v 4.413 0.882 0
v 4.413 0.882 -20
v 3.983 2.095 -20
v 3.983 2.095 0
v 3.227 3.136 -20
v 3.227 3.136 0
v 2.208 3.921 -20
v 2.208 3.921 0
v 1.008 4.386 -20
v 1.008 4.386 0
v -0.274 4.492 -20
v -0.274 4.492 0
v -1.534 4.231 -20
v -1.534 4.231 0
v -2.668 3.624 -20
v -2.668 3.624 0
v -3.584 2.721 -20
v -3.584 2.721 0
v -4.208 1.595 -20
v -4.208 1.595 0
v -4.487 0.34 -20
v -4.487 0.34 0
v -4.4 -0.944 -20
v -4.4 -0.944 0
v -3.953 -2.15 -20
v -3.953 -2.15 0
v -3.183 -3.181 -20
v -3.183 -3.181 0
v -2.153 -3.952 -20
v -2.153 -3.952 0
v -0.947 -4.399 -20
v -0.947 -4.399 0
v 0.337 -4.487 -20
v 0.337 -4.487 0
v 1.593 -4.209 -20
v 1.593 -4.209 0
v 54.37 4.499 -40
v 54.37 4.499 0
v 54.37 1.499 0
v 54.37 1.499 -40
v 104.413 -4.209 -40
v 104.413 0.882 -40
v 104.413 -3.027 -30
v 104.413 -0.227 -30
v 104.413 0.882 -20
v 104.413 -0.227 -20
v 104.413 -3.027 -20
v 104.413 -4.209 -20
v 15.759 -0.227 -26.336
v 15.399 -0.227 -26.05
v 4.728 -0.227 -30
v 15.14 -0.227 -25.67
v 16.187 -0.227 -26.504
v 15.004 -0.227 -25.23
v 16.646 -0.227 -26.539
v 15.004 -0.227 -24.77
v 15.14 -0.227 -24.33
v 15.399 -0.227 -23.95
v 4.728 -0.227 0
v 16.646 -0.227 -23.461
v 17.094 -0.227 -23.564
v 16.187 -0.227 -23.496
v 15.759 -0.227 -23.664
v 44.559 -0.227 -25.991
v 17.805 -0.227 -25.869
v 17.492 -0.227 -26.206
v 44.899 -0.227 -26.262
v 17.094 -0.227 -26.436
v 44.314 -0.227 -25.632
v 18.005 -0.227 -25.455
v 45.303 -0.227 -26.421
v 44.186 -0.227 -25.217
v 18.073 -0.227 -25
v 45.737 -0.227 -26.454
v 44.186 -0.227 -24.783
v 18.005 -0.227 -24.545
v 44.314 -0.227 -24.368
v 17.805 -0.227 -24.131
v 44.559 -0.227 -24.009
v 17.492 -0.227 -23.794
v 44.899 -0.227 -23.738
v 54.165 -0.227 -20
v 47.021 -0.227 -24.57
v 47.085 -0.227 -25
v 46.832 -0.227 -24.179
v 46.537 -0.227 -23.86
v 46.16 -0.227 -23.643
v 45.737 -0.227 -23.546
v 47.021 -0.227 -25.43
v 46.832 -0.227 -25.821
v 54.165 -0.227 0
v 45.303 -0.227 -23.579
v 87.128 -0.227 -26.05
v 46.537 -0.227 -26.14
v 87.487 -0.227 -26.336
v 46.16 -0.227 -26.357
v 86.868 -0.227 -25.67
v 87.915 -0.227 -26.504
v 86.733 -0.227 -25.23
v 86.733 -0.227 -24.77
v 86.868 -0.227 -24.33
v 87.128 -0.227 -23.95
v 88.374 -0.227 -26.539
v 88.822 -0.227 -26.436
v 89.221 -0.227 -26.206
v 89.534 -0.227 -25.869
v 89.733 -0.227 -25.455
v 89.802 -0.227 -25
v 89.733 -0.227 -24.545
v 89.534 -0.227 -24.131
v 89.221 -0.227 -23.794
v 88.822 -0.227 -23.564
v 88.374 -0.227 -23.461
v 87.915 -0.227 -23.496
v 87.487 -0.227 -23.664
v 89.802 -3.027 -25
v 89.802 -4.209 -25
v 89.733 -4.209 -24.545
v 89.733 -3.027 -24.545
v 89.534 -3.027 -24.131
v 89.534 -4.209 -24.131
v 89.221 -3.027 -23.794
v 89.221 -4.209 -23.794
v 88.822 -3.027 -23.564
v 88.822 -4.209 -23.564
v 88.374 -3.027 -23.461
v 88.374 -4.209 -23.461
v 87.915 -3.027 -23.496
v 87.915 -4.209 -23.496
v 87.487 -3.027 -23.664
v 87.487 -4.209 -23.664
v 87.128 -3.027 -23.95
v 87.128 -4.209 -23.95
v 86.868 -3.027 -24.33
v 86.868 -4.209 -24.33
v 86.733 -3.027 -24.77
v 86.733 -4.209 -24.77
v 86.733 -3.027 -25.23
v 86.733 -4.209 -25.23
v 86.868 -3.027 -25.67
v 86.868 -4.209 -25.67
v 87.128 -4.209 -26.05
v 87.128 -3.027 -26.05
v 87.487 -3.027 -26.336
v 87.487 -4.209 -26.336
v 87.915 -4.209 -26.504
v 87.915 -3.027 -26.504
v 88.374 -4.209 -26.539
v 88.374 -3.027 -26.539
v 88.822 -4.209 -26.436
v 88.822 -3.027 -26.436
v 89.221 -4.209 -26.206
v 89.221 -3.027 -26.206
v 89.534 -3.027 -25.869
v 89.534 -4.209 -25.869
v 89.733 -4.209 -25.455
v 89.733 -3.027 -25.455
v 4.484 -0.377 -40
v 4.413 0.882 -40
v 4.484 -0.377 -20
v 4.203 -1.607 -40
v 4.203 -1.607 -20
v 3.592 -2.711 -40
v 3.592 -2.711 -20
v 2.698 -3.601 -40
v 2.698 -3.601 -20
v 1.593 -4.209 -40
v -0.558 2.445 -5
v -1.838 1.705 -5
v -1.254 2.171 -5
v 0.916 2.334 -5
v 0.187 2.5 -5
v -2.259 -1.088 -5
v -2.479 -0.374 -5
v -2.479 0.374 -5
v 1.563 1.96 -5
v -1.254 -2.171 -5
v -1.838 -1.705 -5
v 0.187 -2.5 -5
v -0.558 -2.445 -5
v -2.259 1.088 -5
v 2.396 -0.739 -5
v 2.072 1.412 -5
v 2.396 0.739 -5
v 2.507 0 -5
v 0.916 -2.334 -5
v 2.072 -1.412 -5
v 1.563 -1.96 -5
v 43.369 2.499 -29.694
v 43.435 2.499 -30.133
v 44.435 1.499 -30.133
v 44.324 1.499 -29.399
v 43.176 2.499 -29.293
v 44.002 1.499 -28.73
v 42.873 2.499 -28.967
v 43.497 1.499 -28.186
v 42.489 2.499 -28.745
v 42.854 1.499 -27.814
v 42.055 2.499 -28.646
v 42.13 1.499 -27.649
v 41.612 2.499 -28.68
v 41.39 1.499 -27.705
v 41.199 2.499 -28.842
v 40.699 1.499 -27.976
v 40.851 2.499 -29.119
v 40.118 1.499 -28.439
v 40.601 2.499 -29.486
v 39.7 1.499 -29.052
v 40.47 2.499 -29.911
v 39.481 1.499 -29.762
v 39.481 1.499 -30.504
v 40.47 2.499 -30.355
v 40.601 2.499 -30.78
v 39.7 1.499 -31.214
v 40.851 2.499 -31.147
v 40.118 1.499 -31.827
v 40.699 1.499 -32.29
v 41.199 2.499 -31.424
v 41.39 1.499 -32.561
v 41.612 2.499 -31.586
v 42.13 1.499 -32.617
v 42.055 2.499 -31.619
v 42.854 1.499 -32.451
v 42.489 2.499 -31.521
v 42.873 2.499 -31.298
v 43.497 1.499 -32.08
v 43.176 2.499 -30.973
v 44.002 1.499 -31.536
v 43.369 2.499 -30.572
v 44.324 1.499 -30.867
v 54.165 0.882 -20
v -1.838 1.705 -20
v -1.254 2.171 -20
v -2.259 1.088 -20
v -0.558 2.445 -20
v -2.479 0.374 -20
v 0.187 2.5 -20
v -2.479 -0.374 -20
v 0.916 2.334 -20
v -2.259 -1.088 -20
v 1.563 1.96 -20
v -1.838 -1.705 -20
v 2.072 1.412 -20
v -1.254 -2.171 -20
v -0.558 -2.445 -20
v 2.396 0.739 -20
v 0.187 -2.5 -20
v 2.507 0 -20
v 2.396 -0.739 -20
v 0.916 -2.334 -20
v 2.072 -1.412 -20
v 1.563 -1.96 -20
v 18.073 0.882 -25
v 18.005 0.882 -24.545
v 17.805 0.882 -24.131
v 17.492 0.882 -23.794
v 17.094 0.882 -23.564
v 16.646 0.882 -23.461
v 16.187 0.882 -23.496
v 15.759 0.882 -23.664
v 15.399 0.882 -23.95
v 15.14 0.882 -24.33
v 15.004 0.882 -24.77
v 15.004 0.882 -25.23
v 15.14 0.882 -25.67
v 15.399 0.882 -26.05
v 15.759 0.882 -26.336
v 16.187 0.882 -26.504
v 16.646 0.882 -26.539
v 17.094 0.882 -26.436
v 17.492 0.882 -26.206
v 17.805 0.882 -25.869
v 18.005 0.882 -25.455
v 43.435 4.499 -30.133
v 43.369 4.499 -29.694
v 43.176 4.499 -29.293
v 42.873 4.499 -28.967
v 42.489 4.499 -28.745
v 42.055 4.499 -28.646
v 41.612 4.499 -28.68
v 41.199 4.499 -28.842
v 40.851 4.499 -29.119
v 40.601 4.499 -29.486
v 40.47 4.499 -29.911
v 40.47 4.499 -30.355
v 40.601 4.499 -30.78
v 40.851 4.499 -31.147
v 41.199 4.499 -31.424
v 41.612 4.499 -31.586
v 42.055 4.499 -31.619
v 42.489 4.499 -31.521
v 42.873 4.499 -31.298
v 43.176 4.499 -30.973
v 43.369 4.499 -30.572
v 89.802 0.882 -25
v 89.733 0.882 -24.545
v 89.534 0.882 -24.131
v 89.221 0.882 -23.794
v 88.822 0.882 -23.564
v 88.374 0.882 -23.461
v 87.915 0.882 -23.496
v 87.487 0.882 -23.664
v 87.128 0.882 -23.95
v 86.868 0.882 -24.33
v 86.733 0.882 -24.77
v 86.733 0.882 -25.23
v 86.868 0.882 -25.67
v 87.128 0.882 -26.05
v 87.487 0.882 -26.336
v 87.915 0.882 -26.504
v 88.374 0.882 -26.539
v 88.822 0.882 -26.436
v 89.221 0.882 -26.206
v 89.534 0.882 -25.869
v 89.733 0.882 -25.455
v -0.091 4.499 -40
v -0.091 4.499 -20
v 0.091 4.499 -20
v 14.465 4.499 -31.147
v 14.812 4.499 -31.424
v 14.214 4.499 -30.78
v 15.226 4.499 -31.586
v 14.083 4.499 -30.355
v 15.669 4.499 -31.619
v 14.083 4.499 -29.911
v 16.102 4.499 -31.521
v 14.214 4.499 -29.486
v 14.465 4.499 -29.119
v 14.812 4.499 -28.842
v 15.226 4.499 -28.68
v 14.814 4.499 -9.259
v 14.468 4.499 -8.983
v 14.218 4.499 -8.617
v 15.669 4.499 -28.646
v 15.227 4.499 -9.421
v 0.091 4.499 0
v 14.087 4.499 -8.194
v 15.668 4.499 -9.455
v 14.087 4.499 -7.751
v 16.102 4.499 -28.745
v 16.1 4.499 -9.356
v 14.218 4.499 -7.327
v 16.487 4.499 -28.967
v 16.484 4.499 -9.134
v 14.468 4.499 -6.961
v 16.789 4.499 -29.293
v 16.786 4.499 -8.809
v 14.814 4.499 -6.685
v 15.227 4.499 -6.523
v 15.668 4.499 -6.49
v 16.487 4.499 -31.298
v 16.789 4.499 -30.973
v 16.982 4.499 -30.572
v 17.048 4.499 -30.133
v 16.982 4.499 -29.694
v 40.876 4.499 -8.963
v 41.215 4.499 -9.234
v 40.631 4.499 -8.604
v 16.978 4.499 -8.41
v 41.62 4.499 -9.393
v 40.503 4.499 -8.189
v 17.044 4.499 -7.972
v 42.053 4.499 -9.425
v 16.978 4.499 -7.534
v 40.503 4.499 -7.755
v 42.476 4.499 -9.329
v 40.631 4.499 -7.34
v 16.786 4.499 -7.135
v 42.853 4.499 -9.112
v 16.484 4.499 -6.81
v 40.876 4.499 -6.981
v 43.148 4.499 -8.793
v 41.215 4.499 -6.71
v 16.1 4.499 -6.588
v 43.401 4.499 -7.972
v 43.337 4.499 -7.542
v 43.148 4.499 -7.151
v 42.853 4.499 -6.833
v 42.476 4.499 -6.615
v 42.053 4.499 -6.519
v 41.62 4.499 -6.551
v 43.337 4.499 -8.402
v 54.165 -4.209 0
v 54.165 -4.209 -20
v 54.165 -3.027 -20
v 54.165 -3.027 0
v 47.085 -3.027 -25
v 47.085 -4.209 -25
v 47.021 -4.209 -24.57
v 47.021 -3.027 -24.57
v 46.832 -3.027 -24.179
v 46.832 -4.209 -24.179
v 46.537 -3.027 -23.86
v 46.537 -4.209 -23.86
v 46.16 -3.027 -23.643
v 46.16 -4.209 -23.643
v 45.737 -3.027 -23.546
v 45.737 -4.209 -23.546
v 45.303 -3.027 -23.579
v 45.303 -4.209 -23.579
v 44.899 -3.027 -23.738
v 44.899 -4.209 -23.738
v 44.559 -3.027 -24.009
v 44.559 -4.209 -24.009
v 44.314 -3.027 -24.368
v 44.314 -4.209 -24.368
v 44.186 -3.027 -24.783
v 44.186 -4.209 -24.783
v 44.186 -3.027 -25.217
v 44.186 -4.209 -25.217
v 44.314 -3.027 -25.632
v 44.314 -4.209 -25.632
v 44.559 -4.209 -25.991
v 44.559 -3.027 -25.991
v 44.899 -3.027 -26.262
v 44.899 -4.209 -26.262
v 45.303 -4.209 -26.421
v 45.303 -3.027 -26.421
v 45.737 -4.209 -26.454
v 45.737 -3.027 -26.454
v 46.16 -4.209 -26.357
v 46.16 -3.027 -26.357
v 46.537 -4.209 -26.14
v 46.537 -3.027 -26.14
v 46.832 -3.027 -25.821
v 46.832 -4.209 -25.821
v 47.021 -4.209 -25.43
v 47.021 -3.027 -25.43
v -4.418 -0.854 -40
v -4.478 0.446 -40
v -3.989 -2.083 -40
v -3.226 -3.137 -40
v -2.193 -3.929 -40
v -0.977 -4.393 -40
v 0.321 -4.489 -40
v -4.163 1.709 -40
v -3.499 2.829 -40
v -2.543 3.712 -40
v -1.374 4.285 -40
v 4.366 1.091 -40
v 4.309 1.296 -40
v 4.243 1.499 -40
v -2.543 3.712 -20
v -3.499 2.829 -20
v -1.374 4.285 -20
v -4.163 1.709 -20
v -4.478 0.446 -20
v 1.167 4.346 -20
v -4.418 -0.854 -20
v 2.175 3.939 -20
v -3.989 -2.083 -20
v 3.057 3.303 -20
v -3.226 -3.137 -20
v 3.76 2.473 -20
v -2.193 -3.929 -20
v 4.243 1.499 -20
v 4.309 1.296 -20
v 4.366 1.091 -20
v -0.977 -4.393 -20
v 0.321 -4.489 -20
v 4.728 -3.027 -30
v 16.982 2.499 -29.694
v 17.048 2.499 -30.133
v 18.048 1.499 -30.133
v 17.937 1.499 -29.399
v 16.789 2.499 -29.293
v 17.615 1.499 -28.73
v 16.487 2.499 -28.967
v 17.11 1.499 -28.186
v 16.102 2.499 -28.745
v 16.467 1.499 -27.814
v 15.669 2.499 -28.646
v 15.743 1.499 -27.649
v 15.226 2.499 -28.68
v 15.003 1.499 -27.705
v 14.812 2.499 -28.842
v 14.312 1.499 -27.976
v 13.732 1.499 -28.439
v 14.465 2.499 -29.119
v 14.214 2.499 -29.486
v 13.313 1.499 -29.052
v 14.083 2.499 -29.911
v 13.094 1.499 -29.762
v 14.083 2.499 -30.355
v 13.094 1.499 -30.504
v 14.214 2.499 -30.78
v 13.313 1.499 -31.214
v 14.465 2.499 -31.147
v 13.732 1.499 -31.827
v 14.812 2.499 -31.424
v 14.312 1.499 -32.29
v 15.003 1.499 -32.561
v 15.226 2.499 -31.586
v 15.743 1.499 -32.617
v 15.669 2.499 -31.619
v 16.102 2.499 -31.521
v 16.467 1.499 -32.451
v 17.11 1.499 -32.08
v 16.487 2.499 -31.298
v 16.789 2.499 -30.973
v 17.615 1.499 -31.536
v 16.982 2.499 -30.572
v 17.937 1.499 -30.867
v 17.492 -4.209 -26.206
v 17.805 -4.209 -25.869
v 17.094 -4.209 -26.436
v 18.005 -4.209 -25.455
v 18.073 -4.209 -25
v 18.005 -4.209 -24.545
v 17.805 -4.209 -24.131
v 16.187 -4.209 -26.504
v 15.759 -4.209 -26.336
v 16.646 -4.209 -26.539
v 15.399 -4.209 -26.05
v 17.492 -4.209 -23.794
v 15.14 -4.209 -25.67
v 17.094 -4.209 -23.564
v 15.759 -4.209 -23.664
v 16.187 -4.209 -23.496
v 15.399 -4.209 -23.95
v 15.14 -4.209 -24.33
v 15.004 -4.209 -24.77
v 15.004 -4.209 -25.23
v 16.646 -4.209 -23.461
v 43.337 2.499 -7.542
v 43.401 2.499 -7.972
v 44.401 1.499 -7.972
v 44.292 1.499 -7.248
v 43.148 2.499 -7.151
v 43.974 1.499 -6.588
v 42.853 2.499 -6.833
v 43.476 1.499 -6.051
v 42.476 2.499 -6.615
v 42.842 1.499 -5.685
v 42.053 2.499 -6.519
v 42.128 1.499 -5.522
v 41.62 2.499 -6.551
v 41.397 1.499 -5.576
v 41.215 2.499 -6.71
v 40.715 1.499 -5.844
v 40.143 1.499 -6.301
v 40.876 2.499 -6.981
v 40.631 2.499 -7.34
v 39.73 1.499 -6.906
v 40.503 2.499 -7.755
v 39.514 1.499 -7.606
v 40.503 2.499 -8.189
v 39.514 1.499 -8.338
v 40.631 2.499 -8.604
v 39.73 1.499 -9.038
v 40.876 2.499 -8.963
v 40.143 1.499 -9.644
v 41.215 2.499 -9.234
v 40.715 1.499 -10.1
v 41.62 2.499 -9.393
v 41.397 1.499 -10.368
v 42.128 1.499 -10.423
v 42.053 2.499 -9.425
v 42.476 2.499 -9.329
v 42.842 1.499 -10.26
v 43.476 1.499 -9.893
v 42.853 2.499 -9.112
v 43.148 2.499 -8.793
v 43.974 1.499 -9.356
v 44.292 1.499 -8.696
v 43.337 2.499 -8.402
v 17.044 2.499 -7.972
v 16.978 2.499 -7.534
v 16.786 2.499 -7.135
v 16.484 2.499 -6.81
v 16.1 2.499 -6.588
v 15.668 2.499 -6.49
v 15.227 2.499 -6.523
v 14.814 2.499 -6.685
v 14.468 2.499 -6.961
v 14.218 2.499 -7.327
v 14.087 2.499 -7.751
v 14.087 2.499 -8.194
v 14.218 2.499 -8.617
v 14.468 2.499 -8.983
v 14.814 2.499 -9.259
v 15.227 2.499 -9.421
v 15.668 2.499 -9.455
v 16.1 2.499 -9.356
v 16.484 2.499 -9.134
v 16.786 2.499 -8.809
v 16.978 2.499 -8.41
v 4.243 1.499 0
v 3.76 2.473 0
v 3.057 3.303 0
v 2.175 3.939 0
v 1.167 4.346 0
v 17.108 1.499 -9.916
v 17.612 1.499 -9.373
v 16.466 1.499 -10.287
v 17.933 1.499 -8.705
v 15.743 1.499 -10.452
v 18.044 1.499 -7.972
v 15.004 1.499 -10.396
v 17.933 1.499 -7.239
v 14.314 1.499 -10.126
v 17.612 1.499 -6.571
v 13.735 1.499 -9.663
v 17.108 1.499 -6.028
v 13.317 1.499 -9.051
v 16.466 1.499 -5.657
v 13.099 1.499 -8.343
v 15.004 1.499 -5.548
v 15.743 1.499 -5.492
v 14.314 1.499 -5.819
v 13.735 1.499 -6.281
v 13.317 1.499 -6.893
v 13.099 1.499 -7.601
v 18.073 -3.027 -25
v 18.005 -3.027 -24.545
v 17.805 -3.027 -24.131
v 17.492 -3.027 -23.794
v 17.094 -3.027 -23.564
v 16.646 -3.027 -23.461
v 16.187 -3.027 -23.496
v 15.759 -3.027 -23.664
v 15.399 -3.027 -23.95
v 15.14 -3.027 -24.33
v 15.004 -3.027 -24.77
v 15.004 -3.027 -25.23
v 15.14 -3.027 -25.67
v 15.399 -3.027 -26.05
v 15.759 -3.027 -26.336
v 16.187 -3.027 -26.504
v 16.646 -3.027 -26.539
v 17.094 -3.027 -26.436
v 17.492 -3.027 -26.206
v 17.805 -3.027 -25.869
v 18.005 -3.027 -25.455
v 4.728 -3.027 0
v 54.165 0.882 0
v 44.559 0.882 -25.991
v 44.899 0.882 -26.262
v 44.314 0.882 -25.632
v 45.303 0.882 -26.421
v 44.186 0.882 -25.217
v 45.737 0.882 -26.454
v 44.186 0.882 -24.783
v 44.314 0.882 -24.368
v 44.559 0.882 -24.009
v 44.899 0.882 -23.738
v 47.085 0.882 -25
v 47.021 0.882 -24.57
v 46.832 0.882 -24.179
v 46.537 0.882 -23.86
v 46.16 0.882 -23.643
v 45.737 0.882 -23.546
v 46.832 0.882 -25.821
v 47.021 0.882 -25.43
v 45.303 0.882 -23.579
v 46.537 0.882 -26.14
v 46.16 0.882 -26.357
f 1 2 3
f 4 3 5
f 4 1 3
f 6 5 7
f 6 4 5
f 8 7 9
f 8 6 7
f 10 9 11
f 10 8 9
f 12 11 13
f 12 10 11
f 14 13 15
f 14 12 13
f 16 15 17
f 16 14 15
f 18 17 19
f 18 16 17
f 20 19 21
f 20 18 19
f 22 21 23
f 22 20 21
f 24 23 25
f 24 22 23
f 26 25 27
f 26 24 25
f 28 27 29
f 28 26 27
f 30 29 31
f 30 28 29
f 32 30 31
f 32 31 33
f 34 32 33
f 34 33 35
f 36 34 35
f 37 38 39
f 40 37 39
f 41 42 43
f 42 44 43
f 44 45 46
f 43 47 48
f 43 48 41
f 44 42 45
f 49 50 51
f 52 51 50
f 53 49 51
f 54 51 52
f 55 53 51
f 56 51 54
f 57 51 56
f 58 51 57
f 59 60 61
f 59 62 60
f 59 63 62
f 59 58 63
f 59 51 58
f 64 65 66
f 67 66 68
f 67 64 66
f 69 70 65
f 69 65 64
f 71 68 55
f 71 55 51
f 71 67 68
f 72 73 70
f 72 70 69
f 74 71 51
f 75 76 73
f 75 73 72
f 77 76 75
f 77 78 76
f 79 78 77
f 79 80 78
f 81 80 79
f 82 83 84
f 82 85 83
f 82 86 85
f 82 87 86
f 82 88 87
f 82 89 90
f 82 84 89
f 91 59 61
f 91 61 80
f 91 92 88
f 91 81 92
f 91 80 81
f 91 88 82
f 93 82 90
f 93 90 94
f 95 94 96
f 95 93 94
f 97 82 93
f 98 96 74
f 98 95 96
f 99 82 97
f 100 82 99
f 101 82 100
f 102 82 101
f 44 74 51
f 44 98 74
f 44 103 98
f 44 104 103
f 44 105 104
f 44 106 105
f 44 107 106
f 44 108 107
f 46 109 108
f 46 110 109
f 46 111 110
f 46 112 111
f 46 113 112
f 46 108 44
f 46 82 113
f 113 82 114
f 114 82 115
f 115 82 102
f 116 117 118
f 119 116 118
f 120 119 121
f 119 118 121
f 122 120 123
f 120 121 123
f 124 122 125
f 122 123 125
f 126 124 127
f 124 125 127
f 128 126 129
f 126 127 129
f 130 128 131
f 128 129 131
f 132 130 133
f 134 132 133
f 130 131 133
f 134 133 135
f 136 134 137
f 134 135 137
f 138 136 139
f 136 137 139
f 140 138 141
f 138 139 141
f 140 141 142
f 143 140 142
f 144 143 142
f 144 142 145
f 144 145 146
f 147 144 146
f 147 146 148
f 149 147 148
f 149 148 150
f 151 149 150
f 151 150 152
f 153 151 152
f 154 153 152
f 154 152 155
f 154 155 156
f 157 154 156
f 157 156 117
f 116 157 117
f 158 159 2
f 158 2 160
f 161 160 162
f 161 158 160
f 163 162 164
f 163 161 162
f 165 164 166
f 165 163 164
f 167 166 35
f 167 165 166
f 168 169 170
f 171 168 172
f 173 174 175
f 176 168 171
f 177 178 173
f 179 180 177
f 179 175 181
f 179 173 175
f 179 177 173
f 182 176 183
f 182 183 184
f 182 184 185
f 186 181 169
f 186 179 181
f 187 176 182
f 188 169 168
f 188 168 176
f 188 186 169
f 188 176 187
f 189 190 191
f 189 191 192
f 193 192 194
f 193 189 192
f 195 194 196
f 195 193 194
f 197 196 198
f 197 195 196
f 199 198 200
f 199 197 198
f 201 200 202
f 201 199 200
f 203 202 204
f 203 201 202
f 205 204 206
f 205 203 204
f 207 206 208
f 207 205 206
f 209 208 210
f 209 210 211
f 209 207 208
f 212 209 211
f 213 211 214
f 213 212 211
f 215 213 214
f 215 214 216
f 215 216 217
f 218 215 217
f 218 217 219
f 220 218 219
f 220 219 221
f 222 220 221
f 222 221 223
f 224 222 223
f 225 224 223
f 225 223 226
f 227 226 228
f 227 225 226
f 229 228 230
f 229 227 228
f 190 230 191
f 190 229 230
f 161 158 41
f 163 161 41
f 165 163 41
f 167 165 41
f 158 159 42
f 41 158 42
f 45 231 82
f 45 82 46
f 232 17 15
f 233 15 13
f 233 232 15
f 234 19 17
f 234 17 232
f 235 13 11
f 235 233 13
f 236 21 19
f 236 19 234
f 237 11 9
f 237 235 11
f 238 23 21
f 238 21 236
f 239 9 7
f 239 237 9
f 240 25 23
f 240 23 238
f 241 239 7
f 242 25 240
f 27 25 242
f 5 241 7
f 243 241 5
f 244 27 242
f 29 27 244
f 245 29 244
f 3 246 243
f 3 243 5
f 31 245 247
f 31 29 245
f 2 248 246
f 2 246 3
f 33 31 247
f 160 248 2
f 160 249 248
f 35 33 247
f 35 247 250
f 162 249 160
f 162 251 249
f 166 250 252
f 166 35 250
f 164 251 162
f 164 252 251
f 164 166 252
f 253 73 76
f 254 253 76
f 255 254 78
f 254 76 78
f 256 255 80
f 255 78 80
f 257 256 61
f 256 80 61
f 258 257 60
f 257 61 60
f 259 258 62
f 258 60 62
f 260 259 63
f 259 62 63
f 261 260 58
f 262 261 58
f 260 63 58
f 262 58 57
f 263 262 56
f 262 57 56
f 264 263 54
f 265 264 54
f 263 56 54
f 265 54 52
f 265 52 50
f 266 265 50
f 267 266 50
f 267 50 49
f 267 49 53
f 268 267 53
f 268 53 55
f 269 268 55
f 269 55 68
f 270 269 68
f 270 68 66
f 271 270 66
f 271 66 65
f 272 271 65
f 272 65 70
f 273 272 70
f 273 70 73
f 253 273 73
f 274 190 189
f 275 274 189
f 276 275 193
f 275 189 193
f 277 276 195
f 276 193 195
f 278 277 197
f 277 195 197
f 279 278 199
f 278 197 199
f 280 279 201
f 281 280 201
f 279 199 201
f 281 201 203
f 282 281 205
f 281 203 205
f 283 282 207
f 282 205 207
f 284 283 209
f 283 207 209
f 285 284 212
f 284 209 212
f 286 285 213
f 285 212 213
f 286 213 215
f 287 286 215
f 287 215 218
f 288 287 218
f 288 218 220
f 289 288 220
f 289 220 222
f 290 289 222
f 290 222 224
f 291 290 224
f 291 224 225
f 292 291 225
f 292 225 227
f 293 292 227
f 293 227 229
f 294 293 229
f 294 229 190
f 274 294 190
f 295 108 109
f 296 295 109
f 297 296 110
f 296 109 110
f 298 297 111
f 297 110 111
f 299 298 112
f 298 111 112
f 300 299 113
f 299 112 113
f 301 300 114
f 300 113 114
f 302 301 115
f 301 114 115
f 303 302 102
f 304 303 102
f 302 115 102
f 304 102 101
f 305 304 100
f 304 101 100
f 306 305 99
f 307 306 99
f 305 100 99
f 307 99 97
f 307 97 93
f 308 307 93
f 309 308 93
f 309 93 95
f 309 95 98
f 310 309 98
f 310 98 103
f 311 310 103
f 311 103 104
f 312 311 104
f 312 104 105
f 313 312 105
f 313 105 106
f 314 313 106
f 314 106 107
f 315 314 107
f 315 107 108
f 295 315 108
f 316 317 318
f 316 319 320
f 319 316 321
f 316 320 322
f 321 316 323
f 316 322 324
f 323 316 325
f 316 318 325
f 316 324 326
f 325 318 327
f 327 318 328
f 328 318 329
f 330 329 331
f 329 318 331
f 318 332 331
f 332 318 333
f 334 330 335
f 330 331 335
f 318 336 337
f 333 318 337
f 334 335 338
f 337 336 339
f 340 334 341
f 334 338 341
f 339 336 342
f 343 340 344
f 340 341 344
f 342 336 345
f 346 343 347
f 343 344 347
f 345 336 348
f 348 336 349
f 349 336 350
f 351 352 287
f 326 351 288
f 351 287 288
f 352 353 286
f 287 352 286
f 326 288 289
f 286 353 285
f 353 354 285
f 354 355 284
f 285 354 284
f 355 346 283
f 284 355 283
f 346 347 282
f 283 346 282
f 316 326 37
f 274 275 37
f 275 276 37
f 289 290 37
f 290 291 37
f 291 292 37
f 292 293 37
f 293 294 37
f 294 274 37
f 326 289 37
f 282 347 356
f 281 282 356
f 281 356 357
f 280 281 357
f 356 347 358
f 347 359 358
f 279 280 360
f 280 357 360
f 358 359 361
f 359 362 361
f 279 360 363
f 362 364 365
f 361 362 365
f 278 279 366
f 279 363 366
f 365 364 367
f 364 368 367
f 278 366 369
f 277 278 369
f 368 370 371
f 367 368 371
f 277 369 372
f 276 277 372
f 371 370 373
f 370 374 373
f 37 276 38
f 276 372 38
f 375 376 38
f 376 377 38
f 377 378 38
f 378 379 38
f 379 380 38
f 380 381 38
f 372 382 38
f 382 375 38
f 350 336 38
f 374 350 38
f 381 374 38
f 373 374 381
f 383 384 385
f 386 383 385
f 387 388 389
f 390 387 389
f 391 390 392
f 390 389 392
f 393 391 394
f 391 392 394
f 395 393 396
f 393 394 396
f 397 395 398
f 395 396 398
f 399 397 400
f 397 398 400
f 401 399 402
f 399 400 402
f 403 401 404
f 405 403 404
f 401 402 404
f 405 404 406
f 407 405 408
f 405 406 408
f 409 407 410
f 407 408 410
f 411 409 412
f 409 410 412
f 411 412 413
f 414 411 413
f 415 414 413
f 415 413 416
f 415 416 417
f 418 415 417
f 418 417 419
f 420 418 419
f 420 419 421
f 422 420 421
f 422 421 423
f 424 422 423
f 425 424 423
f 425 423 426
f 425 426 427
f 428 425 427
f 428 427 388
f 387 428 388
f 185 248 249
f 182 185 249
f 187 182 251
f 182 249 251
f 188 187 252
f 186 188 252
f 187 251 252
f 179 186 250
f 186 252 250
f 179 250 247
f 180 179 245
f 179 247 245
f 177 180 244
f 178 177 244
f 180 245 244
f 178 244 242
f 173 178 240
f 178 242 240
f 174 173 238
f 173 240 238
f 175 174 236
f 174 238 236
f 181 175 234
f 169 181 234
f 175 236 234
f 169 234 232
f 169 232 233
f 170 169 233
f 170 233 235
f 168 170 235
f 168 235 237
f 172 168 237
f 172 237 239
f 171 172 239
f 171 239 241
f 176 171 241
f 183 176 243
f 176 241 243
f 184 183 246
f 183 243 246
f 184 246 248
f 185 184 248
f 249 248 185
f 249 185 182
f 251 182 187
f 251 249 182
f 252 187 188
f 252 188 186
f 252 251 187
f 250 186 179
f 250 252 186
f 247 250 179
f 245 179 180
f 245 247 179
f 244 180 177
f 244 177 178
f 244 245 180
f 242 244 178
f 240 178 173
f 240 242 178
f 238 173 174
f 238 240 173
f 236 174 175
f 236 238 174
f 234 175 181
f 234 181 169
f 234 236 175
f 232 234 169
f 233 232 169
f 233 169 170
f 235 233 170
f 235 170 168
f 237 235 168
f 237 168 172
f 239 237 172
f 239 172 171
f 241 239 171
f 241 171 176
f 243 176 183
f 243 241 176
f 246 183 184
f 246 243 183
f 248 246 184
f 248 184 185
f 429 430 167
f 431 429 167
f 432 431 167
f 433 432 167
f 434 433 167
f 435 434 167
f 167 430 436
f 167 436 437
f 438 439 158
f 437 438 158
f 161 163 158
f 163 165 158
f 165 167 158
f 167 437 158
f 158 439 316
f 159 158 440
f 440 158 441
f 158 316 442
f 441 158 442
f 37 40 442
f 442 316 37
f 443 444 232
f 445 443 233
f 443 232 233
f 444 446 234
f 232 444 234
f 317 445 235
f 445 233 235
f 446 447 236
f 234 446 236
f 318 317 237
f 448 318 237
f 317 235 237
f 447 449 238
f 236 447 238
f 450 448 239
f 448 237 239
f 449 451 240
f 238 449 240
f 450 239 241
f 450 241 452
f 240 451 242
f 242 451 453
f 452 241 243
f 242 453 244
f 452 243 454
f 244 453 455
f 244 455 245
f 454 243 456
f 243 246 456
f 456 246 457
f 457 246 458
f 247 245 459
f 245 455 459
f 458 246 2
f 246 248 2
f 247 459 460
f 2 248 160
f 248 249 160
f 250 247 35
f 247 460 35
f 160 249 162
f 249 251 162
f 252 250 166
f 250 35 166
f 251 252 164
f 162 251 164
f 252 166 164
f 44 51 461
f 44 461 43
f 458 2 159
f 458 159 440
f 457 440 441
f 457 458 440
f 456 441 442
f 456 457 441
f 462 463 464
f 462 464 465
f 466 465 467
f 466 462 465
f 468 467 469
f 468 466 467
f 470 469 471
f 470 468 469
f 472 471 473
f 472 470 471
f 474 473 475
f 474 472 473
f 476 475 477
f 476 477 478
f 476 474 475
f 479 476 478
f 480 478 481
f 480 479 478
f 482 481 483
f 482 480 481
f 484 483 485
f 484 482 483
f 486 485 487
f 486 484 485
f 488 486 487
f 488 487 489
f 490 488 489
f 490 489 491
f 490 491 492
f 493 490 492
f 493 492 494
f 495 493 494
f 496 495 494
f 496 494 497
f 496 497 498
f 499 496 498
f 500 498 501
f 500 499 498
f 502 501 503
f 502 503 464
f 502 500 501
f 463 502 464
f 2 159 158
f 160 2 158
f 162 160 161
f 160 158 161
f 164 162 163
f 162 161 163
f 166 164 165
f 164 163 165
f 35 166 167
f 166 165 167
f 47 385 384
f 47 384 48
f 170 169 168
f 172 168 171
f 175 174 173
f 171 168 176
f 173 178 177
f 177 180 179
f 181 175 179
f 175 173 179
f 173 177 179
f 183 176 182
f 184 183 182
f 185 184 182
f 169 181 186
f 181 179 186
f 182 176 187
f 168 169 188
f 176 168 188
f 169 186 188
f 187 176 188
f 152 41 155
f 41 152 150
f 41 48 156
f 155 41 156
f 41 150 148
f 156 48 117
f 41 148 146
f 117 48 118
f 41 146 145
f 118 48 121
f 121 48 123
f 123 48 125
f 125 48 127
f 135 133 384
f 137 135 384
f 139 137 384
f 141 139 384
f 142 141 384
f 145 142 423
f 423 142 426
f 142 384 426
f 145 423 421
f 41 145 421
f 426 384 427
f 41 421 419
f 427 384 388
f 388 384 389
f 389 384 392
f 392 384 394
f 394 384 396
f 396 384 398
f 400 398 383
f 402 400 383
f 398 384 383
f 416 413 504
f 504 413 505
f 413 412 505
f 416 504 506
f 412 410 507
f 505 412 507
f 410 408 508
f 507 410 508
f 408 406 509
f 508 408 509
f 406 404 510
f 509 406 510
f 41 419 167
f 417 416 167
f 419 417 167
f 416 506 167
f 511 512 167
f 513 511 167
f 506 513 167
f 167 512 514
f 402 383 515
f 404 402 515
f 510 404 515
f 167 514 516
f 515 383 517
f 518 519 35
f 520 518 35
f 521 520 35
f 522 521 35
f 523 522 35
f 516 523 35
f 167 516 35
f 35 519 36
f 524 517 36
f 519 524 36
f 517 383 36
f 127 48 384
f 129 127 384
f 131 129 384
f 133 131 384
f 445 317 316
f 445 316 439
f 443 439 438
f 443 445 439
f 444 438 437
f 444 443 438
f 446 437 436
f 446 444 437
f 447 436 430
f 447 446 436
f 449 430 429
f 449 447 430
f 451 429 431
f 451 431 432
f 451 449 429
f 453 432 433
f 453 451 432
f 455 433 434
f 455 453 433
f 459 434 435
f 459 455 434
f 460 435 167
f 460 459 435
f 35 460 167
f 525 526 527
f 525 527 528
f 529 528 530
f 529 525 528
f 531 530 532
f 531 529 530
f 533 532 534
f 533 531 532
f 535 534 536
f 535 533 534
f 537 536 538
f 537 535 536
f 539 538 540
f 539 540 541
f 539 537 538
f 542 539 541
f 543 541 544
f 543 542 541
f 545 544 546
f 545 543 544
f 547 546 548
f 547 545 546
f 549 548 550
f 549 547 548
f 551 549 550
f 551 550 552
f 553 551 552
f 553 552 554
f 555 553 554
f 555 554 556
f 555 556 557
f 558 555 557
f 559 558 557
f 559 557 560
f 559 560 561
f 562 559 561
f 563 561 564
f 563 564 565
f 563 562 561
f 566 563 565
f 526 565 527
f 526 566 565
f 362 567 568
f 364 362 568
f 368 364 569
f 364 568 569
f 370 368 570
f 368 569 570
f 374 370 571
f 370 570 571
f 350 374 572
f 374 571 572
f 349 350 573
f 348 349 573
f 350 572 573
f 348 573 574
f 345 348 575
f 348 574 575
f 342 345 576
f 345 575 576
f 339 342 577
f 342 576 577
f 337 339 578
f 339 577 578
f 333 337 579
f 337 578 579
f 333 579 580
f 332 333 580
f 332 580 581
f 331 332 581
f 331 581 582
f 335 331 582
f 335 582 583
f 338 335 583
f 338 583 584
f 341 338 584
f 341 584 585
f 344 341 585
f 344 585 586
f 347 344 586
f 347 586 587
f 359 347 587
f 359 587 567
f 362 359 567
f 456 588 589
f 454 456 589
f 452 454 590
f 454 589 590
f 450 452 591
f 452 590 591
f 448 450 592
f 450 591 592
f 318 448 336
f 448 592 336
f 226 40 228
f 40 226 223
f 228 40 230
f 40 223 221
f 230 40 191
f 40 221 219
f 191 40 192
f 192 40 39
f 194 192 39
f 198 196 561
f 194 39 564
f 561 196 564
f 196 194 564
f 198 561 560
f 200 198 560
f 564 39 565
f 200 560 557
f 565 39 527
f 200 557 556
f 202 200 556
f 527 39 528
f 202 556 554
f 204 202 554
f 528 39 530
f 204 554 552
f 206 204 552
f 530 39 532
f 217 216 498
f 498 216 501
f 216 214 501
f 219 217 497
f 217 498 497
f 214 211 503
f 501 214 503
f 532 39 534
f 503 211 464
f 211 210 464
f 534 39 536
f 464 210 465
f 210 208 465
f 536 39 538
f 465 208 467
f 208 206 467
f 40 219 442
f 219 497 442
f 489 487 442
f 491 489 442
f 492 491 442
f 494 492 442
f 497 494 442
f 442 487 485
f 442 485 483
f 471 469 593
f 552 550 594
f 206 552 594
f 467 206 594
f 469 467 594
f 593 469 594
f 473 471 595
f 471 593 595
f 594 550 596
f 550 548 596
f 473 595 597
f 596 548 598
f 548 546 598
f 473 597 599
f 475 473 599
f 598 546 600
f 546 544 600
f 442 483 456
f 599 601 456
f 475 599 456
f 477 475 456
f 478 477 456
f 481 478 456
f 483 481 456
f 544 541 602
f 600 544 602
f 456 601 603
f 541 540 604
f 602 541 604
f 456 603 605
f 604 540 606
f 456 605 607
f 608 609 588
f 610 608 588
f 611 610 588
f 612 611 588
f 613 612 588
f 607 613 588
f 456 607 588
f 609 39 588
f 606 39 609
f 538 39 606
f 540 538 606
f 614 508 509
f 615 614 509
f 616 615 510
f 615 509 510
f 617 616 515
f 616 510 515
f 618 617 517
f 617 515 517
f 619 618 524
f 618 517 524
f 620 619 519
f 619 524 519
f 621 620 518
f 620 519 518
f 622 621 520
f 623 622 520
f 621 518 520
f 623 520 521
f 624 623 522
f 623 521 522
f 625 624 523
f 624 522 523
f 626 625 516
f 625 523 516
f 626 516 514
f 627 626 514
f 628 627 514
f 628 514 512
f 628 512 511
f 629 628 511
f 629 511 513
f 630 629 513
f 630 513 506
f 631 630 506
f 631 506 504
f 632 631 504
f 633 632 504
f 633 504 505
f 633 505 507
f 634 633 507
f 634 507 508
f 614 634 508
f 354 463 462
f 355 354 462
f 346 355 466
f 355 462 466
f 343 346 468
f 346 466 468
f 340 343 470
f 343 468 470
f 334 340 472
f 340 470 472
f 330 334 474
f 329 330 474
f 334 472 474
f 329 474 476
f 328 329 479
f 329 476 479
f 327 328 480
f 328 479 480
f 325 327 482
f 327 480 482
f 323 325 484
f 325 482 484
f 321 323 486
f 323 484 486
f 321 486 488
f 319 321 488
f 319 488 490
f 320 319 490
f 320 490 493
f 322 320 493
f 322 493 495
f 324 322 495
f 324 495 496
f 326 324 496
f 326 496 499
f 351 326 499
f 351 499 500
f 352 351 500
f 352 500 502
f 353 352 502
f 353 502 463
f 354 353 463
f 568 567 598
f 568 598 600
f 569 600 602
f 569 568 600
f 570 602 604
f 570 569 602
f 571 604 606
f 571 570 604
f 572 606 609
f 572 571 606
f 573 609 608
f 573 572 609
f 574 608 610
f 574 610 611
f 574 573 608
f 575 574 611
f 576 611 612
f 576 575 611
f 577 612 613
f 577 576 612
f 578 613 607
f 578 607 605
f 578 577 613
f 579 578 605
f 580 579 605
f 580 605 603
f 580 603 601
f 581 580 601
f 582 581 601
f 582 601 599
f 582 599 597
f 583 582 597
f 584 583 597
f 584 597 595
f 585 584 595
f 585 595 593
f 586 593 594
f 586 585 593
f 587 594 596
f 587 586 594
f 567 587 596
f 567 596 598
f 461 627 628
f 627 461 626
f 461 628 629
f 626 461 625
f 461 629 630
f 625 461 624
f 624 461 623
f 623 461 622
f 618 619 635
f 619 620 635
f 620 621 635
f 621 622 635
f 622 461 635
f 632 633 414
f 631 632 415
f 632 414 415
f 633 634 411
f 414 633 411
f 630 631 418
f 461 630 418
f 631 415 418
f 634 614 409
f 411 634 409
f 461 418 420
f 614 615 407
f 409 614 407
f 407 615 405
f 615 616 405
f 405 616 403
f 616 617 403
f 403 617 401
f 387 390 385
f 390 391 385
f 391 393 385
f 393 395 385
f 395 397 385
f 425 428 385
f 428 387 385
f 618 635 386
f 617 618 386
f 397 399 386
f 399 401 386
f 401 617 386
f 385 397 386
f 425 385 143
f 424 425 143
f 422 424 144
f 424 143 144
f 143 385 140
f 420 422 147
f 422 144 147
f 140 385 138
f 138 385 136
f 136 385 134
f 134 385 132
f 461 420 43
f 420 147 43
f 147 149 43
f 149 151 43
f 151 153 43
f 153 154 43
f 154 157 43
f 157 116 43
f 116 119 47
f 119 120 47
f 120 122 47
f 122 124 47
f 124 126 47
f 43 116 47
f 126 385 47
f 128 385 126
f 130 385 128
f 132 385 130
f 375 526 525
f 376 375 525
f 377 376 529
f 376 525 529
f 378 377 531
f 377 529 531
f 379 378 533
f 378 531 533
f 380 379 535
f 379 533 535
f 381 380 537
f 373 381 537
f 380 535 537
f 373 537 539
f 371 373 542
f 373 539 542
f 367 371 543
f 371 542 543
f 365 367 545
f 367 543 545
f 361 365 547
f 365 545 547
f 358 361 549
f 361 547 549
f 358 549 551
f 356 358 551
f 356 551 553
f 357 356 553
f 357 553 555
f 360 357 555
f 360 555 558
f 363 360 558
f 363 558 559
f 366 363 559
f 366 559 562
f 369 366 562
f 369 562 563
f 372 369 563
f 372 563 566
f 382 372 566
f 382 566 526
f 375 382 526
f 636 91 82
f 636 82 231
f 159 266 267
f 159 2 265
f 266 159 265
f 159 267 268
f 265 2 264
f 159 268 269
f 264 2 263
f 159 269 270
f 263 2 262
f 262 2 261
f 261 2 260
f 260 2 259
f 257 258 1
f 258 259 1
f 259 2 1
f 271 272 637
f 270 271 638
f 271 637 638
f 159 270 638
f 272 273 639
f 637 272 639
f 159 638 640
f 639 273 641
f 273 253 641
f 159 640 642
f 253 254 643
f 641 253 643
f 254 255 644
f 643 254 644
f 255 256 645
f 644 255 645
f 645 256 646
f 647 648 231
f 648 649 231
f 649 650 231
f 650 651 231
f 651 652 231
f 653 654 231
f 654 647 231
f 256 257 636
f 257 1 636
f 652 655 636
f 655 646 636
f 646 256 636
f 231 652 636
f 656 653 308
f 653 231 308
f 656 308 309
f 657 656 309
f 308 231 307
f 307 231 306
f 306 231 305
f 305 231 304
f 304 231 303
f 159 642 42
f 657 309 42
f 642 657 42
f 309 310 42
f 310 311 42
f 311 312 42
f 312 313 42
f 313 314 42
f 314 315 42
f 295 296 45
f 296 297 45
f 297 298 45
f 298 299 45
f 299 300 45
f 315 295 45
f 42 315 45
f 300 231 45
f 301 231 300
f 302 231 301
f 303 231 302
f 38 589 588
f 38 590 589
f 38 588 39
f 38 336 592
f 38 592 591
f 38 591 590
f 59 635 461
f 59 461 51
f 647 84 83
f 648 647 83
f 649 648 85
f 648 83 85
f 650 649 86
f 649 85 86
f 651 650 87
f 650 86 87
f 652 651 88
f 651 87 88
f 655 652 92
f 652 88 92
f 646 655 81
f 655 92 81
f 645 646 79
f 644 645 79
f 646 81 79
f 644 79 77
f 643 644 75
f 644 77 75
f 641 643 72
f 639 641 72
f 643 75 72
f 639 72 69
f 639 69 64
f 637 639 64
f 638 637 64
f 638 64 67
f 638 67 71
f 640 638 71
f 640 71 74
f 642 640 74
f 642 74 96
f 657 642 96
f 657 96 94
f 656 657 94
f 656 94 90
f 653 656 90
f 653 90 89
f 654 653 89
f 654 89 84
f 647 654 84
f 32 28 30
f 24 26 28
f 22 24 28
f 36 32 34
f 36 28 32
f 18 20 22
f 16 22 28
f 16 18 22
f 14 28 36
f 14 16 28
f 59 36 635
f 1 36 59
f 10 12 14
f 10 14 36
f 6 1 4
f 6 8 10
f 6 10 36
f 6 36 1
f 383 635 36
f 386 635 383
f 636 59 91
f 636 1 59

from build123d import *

# Parameters (mm, degrees)
PAD001_DEPTH    = 40
SKETCH002_R     = 4.5
POCKET_DEPTH    = 20
SKETCH003_R     = 2.507414
POCKET001_DEPTH = 15
SKETCH004_W     = 50.2480836792
SKETCH004_H     = 5.09126423
POCKET002_DEPTH = 20
SKETCH005_W     = 99.6843096792
SKETCH005_H     = 2.8
POCKET003_DEPTH = 30
PAD_DEPTH       = 40
SKETCH006_R     = 1.486591
SKETCH006_R_2   = 1.457401
SKETCH006_R_3   = 1.490716
SKETCH006_R_4   = 1.490718
POCKET004_DEPTH = 3.001
CHAMFER_SIZE    = 1
SKETCH007_R     = 1.543073
SKETCH007_R_2   = 1.45762
POCKET005_DEPTH = 8.7097898162


with BuildPart() as cerniera_mobile:
    # Sketch001 → Pad001 (new body)
    with BuildSketch(Plane.XY):
        with BuildLine():
            ThreePointArc((4.4126226792, 0.8824744139), (-3.9364511507, 2.1804477381), (1.5925100576, -4.2087898162))
            Line((104.4126226792, -4.2087898162), (1.5925100576, -4.2087898162))
            Line((104.4126226792, 0.8824744139), (104.4126226792, -4.2087898162))
            Line((4.4126226792, 0.8824744139), (104.4126226792, 0.8824744139))
        make_face()
    extrude(amount=-PAD001_DEPTH)

    # Sketch002 → Pocket (cut)
    with BuildSketch(Plane(origin=(0, 0, -40), x_dir=(1, 0, 0), z_dir=(0, 0, -1))):
        Circle(SKETCH002_R)
    extrude(amount=-POCKET_DEPTH, mode=Mode.SUBTRACT)

    # Sketch003 → Pocket001 (cut)
    with BuildSketch(Plane(origin=(0, 0, -20), x_dir=(1, 0, 0), z_dir=(0, 0, -1))):
        Circle(SKETCH003_R)
    extrude(amount=-POCKET001_DEPTH, mode=Mode.SUBTRACT)

    # Sketch004 → Pocket002 (cut)
    with BuildSketch(Plane.XY):
        with Locations((79.2885808396, -1.6631577011)):
            Rectangle(SKETCH004_W, SKETCH004_H)
    extrude(amount=-POCKET002_DEPTH, mode=Mode.SUBTRACT)

    # Sketch005 → Pocket003 (cut)
    with BuildSketch(Plane.XY):
        with Locations((54.5704678396, -1.627362)):
            Rectangle(SKETCH005_W, SKETCH005_H)
    extrude(amount=-POCKET003_DEPTH, mode=Mode.SUBTRACT)


with BuildPart() as cerniera_fissa_buchi_svasati:
    # Sketch → Pad (new body)
    with BuildSketch(Plane.XY):
        with BuildLine():
            ThreePointArc((-0.0905348327, 4.4990891794), (-2.561379334, -3.6999102567), (4.2429626009, 1.4990891794))
            Line((54.3700859693, 1.4990891794), (4.2429626009, 1.4990891794))
            Line((54.3700859693, 4.4990891794), (54.3700859693, 1.4990891794))
            Line((-0.0905348327, 4.4990891794), (54.3700859693, 4.4990891794))
        make_face()
    extrude(amount=-PAD_DEPTH)

    # Cut: cut cerniera_mobile
    add(cerniera_mobile.part, mode=Mode.SUBTRACT)

    # Sketch006 → Pocket004 (cut, through all)
    with BuildSketch(Plane.XZ.offset(-1.4990891794)):
        with Locations((15.5573463219, -7.972067)):
            Circle(SKETCH006_R)
        with Locations((41.9440455, -7.972067)):
            Circle(SKETCH006_R_2)
        with Locations((15.5573463219, -30.132898)):
            Circle(SKETCH006_R_3)
        with Locations((41.9440455, -30.132898)):
            Circle(SKETCH006_R_4)
    extrude(amount=-POCKET004_DEPTH, mode=Mode.SUBTRACT)

    # Chamfer
    chamfer_edges = [cerniera_fissa_buchi_svasati.edges().sort_by_distance(p)[0] for p in [
        (14.070755, 1.499089, -7.972067),
        (40.486645, 1.499089, -7.972067),
        (40.453328, 1.499089, -30.132898),
        (14.06663, 1.499089, -30.132898),
    ]]
    chamfer(chamfer_edges, length=CHAMFER_SIZE)


with BuildPart() as pocket005:
    # Pocket005 base: copy of cerniera_mobile
    add(cerniera_mobile.part)

    # Sketch007 → Pocket005 (cut, through all)
    with BuildSketch(Plane.XZ.offset(4.2087898162)):
        with Locations((88.258736, -25)):
            Circle(SKETCH007_R)
        with Locations((16.530338, -25)):
            Circle(SKETCH007_R)
        with Locations((45.627708, -25)):
            Circle(SKETCH007_R_2)
    extrude(amount=-POCKET005_DEPTH, mode=Mode.SUBTRACT)


solid = Compound([cerniera_fissa_buchi_svasati.part, pocket005.part])
